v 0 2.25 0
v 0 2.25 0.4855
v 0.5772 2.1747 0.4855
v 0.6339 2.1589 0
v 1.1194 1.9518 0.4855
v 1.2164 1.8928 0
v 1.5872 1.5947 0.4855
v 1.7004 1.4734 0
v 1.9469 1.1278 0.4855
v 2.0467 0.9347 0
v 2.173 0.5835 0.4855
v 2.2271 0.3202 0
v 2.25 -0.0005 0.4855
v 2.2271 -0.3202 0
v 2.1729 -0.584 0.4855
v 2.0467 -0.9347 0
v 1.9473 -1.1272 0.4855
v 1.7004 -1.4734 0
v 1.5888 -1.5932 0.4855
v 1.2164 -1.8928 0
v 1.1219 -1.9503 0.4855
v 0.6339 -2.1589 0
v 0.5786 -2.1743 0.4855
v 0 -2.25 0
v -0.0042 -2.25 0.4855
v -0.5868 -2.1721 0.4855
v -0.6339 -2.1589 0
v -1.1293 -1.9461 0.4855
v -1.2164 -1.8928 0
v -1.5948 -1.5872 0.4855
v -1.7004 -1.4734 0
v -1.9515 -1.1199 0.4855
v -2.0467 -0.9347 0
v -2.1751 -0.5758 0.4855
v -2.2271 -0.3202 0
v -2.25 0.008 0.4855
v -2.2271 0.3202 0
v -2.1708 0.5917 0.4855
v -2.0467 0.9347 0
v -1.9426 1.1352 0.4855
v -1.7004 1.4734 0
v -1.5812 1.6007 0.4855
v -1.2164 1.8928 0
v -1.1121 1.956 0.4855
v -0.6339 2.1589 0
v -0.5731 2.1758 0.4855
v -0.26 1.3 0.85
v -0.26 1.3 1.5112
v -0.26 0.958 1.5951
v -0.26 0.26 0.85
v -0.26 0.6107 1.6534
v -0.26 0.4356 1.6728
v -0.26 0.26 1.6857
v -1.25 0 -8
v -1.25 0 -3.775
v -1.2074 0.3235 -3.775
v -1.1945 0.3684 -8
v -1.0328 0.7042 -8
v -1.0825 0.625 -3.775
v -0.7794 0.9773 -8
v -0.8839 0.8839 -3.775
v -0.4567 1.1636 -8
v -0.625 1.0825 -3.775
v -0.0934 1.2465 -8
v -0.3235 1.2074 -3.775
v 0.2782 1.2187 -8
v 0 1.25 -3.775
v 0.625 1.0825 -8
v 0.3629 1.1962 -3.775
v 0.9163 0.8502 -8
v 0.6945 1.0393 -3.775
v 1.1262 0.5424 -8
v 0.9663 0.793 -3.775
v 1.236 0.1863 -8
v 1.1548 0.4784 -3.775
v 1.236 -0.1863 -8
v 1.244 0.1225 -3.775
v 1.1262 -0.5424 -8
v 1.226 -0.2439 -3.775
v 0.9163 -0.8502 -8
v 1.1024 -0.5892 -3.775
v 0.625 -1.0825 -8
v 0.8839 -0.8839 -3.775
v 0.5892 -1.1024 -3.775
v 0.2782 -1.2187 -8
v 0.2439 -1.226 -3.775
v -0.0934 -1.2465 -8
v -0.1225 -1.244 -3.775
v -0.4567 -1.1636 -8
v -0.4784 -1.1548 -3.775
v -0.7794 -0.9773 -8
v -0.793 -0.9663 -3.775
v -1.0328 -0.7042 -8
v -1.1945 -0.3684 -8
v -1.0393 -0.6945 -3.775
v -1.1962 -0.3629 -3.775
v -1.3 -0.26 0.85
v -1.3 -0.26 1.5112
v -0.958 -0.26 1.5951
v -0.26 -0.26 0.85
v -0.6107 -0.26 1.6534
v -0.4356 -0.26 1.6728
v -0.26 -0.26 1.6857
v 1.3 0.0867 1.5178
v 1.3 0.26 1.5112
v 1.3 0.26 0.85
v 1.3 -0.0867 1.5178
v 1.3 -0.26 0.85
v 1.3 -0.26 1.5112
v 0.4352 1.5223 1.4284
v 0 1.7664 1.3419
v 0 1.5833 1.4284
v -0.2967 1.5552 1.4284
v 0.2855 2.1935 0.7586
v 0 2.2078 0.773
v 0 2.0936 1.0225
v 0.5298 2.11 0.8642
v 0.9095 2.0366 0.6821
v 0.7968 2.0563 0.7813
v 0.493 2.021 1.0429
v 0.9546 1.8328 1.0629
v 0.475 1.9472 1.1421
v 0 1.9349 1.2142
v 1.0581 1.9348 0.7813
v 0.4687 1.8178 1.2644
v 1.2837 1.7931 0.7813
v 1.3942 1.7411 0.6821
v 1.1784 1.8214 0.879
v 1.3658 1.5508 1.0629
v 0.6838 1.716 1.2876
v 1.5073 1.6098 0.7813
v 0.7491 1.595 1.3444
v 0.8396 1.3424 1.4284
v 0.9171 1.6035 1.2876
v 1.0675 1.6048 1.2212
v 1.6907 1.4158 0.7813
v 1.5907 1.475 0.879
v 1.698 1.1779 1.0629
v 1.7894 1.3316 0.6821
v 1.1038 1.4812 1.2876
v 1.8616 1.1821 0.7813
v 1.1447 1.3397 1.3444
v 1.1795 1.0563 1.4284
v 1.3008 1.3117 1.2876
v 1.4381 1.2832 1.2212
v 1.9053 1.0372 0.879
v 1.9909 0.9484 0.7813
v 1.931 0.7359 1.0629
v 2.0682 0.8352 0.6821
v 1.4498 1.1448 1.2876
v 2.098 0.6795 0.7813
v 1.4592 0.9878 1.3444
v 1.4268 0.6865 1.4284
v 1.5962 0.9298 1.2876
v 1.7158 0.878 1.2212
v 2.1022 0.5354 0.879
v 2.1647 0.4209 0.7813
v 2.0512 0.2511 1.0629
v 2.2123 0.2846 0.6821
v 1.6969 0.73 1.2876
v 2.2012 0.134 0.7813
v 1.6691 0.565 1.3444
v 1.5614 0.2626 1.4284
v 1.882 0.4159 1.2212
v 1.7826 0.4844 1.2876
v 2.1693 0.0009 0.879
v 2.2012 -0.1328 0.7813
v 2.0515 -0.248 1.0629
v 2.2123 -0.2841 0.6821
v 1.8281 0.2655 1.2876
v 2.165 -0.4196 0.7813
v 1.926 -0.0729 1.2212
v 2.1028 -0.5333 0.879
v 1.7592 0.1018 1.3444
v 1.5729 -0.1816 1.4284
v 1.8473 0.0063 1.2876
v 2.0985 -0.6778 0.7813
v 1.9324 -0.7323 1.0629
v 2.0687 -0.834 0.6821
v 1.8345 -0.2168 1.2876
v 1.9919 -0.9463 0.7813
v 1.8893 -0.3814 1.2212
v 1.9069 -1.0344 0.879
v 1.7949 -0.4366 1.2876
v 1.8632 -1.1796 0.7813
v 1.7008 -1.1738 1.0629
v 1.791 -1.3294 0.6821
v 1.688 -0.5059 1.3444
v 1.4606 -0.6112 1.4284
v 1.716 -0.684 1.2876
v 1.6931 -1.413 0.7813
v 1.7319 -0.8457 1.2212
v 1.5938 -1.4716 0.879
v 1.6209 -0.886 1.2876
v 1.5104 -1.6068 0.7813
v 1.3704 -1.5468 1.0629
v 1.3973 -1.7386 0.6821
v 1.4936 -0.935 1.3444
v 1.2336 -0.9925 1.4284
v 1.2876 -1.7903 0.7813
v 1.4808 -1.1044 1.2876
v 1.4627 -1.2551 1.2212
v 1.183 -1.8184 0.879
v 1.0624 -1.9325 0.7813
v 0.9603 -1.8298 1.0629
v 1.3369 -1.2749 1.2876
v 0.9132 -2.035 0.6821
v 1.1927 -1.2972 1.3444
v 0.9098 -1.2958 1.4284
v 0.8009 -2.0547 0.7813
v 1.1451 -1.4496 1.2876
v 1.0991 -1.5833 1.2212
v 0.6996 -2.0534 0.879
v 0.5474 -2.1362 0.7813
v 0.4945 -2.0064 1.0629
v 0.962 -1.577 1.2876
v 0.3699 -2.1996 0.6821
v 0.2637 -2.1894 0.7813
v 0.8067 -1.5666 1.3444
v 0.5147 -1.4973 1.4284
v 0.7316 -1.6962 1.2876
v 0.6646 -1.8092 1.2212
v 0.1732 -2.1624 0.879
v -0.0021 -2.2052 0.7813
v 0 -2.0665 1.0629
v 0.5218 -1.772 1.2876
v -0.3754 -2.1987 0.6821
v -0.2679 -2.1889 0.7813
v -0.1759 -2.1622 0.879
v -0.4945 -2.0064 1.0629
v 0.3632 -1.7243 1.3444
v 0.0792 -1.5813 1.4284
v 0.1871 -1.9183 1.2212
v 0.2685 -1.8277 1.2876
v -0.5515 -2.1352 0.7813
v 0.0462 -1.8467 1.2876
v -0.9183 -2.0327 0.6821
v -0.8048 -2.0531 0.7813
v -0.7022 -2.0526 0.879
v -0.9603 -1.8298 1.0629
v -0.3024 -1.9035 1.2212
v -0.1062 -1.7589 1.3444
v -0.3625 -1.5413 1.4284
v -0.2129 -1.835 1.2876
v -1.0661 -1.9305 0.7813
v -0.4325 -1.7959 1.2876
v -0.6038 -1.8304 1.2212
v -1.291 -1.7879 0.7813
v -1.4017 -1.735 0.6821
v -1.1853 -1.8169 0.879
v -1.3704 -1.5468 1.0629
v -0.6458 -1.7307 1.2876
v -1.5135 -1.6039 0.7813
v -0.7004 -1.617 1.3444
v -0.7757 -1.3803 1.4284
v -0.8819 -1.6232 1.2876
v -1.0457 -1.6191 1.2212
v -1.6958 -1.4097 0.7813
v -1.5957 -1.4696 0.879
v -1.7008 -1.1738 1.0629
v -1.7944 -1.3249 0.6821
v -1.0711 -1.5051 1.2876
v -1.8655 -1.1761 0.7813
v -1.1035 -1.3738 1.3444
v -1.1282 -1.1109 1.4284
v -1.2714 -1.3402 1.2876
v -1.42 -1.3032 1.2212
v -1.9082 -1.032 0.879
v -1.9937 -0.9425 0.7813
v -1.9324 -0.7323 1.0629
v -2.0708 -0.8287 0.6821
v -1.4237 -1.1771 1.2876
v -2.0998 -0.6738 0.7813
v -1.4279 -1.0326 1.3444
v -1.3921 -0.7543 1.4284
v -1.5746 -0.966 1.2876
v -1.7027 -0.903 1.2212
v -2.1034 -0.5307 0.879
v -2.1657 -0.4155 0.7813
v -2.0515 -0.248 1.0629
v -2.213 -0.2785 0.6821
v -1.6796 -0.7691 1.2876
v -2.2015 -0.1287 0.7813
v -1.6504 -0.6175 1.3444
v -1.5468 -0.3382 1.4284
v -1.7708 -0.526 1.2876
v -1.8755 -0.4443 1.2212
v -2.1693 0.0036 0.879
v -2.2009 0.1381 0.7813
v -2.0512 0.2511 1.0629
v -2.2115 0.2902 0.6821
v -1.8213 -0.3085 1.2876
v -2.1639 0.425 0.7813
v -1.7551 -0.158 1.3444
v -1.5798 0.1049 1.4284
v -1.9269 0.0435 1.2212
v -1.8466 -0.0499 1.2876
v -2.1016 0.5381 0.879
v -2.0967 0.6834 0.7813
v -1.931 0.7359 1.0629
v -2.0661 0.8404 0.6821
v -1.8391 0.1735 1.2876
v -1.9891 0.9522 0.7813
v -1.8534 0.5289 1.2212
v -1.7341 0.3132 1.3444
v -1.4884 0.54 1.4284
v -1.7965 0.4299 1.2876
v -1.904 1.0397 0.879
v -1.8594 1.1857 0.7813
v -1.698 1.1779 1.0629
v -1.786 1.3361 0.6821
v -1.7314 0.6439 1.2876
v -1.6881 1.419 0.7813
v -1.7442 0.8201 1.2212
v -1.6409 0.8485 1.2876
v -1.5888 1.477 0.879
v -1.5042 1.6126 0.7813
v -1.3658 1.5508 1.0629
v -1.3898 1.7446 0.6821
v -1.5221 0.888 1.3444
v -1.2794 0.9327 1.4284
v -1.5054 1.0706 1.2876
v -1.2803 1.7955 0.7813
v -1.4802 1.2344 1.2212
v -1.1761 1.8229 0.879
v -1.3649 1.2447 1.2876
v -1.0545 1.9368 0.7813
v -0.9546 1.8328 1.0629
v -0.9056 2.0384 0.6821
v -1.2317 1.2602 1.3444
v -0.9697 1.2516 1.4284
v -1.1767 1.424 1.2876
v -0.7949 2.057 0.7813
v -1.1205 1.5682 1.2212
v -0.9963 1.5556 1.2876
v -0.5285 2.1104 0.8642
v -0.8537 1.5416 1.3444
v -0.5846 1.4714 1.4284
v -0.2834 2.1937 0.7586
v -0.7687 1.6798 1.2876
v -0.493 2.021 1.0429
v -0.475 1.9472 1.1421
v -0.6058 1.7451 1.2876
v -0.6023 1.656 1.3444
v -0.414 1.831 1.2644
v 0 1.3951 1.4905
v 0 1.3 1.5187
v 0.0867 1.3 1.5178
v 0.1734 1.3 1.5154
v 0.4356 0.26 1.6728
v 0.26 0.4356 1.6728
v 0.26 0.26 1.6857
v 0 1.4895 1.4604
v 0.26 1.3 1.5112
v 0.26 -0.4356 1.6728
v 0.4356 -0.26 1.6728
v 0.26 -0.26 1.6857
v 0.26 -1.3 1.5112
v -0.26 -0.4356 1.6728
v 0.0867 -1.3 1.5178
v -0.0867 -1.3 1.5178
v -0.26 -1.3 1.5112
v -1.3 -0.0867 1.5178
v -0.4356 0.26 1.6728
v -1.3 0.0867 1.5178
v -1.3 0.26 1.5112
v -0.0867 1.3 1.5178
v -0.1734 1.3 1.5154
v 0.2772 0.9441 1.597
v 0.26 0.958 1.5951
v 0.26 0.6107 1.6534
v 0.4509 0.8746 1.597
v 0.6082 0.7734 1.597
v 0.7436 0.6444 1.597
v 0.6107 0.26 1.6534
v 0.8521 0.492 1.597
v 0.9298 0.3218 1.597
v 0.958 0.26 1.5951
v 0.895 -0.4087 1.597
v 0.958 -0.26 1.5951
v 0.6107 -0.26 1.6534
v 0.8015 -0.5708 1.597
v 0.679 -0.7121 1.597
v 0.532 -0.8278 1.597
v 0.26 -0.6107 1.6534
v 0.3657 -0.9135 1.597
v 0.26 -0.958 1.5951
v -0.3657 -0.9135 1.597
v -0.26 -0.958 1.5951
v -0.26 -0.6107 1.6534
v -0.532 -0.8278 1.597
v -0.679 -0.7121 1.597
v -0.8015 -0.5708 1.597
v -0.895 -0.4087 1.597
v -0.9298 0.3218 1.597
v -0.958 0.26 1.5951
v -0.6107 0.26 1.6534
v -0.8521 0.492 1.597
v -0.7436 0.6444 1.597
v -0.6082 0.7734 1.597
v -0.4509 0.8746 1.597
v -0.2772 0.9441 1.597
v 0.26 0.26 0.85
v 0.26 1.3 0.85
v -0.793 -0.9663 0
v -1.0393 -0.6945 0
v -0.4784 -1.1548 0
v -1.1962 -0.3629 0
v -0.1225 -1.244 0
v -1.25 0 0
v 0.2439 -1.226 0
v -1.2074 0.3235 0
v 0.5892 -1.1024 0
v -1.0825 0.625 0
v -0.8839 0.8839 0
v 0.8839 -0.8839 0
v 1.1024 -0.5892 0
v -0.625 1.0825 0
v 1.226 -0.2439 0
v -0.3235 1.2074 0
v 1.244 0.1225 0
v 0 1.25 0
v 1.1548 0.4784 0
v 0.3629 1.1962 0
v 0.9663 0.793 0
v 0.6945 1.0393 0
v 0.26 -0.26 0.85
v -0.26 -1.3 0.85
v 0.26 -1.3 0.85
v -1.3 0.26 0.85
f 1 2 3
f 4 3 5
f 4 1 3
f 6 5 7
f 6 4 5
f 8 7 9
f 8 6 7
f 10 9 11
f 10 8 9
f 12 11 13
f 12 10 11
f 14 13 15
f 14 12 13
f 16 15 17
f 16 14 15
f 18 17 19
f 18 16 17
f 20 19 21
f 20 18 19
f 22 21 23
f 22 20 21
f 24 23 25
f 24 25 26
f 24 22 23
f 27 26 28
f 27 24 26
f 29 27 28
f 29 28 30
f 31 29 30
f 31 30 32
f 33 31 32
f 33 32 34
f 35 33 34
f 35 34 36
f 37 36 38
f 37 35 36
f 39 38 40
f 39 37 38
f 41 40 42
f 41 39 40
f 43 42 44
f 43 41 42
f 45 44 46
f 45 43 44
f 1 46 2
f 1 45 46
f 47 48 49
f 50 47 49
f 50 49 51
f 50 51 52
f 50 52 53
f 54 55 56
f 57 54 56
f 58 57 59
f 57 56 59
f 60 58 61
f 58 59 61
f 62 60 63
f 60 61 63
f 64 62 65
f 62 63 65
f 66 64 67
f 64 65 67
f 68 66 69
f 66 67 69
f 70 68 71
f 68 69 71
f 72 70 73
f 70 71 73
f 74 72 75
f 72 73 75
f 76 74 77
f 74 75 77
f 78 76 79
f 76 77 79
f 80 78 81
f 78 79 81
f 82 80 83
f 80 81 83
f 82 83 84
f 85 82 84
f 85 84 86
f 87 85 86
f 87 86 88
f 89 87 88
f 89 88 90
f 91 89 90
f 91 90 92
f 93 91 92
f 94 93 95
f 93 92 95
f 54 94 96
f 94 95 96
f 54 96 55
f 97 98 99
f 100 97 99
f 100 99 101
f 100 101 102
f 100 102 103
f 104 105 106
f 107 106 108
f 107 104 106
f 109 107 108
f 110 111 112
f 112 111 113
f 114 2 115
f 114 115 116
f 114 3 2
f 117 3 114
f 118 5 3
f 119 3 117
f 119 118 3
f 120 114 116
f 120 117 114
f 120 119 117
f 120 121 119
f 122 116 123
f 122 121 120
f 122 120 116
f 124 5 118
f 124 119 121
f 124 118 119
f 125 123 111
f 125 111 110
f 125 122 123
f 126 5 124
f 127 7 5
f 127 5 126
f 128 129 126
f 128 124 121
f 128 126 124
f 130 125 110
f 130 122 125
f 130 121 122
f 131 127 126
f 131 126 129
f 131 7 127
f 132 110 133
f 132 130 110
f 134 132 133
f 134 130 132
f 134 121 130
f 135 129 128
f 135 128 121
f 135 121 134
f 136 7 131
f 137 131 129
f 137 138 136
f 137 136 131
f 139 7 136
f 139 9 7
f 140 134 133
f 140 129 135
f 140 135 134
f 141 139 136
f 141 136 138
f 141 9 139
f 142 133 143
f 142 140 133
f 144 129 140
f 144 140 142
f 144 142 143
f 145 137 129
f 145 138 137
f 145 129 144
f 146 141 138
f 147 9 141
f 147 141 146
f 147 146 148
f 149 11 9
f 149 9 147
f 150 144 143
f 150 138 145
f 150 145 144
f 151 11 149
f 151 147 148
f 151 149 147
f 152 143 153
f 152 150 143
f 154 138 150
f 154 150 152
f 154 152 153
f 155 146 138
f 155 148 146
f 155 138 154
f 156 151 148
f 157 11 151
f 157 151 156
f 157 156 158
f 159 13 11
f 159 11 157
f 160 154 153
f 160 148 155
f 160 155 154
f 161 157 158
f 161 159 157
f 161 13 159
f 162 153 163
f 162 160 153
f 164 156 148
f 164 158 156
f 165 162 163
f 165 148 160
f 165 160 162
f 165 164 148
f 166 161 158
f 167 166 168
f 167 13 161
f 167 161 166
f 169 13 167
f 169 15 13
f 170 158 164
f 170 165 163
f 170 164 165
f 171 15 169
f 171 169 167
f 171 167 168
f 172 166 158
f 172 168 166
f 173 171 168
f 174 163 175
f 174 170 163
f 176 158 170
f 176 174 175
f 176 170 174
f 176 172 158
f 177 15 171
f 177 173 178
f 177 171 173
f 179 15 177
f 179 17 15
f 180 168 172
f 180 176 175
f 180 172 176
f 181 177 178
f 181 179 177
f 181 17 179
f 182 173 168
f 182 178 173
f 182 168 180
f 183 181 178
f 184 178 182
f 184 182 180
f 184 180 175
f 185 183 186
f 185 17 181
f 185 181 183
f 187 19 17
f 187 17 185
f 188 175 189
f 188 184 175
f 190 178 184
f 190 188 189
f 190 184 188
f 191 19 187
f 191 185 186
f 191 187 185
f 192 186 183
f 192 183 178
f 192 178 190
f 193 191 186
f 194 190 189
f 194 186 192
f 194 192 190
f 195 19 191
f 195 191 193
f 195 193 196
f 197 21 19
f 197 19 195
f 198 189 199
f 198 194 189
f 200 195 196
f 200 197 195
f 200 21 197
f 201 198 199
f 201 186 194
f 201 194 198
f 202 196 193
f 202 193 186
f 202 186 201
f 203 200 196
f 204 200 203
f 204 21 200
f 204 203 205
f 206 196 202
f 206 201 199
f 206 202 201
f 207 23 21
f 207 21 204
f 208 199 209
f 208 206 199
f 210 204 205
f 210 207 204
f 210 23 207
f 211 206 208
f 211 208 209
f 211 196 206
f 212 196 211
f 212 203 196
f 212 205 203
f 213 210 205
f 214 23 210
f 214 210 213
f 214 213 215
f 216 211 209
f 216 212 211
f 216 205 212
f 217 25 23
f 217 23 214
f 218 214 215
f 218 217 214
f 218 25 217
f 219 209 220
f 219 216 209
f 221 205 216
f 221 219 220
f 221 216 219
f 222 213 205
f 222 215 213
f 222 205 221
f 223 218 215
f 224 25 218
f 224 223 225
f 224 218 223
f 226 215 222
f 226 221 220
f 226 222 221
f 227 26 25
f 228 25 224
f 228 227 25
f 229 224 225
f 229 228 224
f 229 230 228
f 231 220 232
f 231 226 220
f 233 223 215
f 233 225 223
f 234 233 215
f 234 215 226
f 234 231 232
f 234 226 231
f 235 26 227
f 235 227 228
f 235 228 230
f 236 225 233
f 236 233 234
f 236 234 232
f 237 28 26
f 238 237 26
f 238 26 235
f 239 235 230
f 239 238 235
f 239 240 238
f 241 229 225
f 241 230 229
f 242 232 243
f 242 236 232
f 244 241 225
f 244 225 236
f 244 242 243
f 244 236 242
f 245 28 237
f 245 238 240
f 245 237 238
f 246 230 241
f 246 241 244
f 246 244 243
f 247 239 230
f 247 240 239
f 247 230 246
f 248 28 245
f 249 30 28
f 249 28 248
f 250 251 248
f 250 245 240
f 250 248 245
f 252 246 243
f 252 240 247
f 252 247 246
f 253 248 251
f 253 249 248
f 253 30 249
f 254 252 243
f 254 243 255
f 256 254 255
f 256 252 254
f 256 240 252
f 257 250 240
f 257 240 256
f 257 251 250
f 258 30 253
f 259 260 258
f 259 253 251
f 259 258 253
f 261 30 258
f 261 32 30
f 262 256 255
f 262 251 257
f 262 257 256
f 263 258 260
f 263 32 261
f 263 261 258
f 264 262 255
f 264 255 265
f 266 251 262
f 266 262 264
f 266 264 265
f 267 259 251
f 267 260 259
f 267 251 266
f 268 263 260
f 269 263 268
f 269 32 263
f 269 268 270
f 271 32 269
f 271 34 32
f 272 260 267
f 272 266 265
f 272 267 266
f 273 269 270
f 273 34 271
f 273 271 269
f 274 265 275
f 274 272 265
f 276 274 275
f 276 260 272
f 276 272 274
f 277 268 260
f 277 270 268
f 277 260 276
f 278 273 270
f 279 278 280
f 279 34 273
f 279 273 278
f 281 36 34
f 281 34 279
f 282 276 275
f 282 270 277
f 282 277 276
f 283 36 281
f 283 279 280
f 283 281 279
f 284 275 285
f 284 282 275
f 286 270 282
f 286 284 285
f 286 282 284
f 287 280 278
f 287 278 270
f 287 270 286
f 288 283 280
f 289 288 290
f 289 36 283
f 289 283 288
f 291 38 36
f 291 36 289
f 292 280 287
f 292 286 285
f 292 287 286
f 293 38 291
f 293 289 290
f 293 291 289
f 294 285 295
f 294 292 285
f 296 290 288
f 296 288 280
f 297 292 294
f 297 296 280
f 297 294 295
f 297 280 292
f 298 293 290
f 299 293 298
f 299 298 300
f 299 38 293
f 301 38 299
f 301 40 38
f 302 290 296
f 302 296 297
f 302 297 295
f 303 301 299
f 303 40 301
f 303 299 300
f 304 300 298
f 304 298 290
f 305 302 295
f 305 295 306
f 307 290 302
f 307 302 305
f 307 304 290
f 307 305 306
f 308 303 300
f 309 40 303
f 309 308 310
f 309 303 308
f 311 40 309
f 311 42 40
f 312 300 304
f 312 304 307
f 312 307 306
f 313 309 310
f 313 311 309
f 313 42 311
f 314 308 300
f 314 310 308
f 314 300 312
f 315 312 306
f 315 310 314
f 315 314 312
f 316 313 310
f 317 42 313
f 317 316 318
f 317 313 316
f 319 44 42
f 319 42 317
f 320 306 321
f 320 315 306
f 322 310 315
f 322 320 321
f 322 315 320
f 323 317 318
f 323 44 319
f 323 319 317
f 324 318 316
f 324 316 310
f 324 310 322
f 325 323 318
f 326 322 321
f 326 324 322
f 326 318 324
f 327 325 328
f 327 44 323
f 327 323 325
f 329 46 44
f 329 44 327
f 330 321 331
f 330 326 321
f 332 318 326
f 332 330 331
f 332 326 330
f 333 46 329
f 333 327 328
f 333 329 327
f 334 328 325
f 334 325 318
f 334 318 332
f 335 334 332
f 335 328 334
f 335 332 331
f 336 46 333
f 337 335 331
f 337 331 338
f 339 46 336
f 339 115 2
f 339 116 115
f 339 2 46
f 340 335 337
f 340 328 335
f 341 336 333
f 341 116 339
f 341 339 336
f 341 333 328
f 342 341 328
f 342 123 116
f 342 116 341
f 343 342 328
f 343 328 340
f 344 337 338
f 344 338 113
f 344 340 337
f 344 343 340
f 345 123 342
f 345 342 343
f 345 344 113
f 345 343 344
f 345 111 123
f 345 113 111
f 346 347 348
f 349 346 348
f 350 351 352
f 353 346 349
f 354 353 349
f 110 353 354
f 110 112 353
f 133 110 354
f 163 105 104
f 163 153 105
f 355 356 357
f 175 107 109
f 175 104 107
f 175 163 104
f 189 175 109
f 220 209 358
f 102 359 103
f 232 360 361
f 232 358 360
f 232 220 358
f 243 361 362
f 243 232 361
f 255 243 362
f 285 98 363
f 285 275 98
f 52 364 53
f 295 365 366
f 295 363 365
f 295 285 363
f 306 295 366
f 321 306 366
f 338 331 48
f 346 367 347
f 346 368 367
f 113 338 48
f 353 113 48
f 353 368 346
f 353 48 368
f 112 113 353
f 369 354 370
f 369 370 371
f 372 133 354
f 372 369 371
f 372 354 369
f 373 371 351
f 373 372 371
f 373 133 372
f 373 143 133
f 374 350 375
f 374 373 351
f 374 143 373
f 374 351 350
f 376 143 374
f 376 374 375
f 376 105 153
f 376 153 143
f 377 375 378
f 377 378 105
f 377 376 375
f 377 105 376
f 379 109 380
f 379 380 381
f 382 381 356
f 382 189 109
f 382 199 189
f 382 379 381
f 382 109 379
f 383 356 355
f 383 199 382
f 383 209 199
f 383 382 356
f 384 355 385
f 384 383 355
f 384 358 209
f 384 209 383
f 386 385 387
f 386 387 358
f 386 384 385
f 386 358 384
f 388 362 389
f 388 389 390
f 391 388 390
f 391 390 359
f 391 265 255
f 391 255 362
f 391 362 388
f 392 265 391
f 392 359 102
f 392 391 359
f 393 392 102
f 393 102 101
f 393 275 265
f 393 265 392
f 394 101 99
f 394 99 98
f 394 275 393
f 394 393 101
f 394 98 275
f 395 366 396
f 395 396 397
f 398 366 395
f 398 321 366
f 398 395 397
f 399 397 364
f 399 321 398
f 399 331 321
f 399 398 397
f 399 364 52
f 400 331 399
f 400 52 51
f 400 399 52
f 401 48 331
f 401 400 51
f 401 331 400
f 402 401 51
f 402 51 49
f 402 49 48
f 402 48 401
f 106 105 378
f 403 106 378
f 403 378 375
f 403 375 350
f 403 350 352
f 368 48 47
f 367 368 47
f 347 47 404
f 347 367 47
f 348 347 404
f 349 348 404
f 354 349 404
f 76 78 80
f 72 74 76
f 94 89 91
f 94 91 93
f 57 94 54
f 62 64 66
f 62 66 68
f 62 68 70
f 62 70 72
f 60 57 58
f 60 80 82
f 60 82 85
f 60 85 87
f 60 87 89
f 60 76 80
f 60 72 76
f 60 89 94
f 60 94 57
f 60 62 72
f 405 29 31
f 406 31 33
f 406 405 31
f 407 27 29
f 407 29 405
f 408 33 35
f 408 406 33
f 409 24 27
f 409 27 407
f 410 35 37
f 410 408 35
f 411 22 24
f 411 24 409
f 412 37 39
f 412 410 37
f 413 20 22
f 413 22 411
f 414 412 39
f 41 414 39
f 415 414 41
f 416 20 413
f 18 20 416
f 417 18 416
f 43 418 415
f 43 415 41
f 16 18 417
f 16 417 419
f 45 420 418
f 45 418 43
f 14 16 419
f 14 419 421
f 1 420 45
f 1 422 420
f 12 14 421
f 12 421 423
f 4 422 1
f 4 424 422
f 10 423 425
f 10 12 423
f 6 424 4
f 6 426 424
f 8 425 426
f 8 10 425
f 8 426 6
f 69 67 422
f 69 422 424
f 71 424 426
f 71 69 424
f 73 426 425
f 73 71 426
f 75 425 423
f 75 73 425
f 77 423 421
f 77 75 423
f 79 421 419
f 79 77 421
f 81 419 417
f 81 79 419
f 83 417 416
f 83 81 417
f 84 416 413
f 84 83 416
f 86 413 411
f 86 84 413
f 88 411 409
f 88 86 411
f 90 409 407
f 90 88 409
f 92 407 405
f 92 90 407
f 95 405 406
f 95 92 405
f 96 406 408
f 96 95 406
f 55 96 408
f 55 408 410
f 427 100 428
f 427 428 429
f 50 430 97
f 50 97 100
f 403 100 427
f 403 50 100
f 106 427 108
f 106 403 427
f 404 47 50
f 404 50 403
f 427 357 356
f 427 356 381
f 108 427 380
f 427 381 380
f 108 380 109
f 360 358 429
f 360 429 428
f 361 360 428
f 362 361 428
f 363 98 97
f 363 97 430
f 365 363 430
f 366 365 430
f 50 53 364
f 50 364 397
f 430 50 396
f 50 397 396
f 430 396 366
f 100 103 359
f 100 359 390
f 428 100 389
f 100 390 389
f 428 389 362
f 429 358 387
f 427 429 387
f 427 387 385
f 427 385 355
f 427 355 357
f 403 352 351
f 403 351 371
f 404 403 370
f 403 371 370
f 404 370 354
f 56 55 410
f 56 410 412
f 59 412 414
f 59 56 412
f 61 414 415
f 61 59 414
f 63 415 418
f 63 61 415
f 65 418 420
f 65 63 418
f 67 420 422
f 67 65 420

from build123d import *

# Parameters (mm, degrees)
CUT_EXTRUDE2_DEPTH = 0.85
FILLET1_R          = 1
CHAMFER1_SIZE      = 0.225
ESQUISSE1_R        = 1.25
BOSS_EXTRU_1_DEPTH = 8


with BuildPart() as part:
    # Sketch1 → Revolve1 (revolve)
    with BuildSketch(Plane(origin=(0, 0, 0), x_dir=(0, 0, -1), z_dir=(1, 0, 0))):
        with BuildLine():
            Line((-1.133333333, 2.25), (0, 2.25))
            Line((0, 2.25), (0, 1.25))
            Line((0, 1.25), (4, 1.25))
            Line((4, 1.25), (4, 0))
            Line((4, 0), (-1.7, 0))
            ThreePointArc((-1.7, 0), (-1.556155418, 1.1601305), (-1.133333333, 2.25))
        make_face()
    revolve(axis=Axis((0, 0, 33.735969773), (0, 0, -1)))

    # Sketch2 → Cut-Extrude2 (cut)
    with BuildSketch(Plane(origin=(0, 0, 1.7), x_dir=(-1, 0, 0), z_dir=(0, 0, -1))):
        Polygon((0, 1.3), (0.26, 1.3), (0.26, 0.26), (1.3, 0.26), (1.3, 0), (1.3, -0.26), (0.26, -0.26), (0.26, -1.3), (0, -1.3), (-0.26, -1.3), (-0.26, -0.26), (-1.3, -0.26), (-1.3, 0), (-1.3, 0.26), (-0.26, 0.26), (-0.26, 1.3), align=None)
    extrude(amount=CUT_EXTRUDE2_DEPTH, mode=Mode.SUBTRACT)

    # Fillet1
    fillet1_edges = [part.edges().sort_by_distance(p)[0] for p in [
        (0, -2.25, 1.133333333),
    ]]
    fillet(fillet1_edges, radius=FILLET1_R)

    # Chamfer1
    chamfer1_edges = [part.edges().sort_by_distance(p)[0] for p in [
        (0, -1.25, -4),
    ]]
    chamfer(chamfer1_edges, length=CHAMFER1_SIZE)

    # Esquisse1 → Boss.-Extru.1 (add)
    with BuildSketch(Plane(origin=(0, 0, 0), x_dir=(-1, 0, 0), z_dir=(0, 0, -1))):
        Circle(ESQUISSE1_R)
    extrude(amount=BOSS_EXTRU_1_DEPTH)


solid = part.part
